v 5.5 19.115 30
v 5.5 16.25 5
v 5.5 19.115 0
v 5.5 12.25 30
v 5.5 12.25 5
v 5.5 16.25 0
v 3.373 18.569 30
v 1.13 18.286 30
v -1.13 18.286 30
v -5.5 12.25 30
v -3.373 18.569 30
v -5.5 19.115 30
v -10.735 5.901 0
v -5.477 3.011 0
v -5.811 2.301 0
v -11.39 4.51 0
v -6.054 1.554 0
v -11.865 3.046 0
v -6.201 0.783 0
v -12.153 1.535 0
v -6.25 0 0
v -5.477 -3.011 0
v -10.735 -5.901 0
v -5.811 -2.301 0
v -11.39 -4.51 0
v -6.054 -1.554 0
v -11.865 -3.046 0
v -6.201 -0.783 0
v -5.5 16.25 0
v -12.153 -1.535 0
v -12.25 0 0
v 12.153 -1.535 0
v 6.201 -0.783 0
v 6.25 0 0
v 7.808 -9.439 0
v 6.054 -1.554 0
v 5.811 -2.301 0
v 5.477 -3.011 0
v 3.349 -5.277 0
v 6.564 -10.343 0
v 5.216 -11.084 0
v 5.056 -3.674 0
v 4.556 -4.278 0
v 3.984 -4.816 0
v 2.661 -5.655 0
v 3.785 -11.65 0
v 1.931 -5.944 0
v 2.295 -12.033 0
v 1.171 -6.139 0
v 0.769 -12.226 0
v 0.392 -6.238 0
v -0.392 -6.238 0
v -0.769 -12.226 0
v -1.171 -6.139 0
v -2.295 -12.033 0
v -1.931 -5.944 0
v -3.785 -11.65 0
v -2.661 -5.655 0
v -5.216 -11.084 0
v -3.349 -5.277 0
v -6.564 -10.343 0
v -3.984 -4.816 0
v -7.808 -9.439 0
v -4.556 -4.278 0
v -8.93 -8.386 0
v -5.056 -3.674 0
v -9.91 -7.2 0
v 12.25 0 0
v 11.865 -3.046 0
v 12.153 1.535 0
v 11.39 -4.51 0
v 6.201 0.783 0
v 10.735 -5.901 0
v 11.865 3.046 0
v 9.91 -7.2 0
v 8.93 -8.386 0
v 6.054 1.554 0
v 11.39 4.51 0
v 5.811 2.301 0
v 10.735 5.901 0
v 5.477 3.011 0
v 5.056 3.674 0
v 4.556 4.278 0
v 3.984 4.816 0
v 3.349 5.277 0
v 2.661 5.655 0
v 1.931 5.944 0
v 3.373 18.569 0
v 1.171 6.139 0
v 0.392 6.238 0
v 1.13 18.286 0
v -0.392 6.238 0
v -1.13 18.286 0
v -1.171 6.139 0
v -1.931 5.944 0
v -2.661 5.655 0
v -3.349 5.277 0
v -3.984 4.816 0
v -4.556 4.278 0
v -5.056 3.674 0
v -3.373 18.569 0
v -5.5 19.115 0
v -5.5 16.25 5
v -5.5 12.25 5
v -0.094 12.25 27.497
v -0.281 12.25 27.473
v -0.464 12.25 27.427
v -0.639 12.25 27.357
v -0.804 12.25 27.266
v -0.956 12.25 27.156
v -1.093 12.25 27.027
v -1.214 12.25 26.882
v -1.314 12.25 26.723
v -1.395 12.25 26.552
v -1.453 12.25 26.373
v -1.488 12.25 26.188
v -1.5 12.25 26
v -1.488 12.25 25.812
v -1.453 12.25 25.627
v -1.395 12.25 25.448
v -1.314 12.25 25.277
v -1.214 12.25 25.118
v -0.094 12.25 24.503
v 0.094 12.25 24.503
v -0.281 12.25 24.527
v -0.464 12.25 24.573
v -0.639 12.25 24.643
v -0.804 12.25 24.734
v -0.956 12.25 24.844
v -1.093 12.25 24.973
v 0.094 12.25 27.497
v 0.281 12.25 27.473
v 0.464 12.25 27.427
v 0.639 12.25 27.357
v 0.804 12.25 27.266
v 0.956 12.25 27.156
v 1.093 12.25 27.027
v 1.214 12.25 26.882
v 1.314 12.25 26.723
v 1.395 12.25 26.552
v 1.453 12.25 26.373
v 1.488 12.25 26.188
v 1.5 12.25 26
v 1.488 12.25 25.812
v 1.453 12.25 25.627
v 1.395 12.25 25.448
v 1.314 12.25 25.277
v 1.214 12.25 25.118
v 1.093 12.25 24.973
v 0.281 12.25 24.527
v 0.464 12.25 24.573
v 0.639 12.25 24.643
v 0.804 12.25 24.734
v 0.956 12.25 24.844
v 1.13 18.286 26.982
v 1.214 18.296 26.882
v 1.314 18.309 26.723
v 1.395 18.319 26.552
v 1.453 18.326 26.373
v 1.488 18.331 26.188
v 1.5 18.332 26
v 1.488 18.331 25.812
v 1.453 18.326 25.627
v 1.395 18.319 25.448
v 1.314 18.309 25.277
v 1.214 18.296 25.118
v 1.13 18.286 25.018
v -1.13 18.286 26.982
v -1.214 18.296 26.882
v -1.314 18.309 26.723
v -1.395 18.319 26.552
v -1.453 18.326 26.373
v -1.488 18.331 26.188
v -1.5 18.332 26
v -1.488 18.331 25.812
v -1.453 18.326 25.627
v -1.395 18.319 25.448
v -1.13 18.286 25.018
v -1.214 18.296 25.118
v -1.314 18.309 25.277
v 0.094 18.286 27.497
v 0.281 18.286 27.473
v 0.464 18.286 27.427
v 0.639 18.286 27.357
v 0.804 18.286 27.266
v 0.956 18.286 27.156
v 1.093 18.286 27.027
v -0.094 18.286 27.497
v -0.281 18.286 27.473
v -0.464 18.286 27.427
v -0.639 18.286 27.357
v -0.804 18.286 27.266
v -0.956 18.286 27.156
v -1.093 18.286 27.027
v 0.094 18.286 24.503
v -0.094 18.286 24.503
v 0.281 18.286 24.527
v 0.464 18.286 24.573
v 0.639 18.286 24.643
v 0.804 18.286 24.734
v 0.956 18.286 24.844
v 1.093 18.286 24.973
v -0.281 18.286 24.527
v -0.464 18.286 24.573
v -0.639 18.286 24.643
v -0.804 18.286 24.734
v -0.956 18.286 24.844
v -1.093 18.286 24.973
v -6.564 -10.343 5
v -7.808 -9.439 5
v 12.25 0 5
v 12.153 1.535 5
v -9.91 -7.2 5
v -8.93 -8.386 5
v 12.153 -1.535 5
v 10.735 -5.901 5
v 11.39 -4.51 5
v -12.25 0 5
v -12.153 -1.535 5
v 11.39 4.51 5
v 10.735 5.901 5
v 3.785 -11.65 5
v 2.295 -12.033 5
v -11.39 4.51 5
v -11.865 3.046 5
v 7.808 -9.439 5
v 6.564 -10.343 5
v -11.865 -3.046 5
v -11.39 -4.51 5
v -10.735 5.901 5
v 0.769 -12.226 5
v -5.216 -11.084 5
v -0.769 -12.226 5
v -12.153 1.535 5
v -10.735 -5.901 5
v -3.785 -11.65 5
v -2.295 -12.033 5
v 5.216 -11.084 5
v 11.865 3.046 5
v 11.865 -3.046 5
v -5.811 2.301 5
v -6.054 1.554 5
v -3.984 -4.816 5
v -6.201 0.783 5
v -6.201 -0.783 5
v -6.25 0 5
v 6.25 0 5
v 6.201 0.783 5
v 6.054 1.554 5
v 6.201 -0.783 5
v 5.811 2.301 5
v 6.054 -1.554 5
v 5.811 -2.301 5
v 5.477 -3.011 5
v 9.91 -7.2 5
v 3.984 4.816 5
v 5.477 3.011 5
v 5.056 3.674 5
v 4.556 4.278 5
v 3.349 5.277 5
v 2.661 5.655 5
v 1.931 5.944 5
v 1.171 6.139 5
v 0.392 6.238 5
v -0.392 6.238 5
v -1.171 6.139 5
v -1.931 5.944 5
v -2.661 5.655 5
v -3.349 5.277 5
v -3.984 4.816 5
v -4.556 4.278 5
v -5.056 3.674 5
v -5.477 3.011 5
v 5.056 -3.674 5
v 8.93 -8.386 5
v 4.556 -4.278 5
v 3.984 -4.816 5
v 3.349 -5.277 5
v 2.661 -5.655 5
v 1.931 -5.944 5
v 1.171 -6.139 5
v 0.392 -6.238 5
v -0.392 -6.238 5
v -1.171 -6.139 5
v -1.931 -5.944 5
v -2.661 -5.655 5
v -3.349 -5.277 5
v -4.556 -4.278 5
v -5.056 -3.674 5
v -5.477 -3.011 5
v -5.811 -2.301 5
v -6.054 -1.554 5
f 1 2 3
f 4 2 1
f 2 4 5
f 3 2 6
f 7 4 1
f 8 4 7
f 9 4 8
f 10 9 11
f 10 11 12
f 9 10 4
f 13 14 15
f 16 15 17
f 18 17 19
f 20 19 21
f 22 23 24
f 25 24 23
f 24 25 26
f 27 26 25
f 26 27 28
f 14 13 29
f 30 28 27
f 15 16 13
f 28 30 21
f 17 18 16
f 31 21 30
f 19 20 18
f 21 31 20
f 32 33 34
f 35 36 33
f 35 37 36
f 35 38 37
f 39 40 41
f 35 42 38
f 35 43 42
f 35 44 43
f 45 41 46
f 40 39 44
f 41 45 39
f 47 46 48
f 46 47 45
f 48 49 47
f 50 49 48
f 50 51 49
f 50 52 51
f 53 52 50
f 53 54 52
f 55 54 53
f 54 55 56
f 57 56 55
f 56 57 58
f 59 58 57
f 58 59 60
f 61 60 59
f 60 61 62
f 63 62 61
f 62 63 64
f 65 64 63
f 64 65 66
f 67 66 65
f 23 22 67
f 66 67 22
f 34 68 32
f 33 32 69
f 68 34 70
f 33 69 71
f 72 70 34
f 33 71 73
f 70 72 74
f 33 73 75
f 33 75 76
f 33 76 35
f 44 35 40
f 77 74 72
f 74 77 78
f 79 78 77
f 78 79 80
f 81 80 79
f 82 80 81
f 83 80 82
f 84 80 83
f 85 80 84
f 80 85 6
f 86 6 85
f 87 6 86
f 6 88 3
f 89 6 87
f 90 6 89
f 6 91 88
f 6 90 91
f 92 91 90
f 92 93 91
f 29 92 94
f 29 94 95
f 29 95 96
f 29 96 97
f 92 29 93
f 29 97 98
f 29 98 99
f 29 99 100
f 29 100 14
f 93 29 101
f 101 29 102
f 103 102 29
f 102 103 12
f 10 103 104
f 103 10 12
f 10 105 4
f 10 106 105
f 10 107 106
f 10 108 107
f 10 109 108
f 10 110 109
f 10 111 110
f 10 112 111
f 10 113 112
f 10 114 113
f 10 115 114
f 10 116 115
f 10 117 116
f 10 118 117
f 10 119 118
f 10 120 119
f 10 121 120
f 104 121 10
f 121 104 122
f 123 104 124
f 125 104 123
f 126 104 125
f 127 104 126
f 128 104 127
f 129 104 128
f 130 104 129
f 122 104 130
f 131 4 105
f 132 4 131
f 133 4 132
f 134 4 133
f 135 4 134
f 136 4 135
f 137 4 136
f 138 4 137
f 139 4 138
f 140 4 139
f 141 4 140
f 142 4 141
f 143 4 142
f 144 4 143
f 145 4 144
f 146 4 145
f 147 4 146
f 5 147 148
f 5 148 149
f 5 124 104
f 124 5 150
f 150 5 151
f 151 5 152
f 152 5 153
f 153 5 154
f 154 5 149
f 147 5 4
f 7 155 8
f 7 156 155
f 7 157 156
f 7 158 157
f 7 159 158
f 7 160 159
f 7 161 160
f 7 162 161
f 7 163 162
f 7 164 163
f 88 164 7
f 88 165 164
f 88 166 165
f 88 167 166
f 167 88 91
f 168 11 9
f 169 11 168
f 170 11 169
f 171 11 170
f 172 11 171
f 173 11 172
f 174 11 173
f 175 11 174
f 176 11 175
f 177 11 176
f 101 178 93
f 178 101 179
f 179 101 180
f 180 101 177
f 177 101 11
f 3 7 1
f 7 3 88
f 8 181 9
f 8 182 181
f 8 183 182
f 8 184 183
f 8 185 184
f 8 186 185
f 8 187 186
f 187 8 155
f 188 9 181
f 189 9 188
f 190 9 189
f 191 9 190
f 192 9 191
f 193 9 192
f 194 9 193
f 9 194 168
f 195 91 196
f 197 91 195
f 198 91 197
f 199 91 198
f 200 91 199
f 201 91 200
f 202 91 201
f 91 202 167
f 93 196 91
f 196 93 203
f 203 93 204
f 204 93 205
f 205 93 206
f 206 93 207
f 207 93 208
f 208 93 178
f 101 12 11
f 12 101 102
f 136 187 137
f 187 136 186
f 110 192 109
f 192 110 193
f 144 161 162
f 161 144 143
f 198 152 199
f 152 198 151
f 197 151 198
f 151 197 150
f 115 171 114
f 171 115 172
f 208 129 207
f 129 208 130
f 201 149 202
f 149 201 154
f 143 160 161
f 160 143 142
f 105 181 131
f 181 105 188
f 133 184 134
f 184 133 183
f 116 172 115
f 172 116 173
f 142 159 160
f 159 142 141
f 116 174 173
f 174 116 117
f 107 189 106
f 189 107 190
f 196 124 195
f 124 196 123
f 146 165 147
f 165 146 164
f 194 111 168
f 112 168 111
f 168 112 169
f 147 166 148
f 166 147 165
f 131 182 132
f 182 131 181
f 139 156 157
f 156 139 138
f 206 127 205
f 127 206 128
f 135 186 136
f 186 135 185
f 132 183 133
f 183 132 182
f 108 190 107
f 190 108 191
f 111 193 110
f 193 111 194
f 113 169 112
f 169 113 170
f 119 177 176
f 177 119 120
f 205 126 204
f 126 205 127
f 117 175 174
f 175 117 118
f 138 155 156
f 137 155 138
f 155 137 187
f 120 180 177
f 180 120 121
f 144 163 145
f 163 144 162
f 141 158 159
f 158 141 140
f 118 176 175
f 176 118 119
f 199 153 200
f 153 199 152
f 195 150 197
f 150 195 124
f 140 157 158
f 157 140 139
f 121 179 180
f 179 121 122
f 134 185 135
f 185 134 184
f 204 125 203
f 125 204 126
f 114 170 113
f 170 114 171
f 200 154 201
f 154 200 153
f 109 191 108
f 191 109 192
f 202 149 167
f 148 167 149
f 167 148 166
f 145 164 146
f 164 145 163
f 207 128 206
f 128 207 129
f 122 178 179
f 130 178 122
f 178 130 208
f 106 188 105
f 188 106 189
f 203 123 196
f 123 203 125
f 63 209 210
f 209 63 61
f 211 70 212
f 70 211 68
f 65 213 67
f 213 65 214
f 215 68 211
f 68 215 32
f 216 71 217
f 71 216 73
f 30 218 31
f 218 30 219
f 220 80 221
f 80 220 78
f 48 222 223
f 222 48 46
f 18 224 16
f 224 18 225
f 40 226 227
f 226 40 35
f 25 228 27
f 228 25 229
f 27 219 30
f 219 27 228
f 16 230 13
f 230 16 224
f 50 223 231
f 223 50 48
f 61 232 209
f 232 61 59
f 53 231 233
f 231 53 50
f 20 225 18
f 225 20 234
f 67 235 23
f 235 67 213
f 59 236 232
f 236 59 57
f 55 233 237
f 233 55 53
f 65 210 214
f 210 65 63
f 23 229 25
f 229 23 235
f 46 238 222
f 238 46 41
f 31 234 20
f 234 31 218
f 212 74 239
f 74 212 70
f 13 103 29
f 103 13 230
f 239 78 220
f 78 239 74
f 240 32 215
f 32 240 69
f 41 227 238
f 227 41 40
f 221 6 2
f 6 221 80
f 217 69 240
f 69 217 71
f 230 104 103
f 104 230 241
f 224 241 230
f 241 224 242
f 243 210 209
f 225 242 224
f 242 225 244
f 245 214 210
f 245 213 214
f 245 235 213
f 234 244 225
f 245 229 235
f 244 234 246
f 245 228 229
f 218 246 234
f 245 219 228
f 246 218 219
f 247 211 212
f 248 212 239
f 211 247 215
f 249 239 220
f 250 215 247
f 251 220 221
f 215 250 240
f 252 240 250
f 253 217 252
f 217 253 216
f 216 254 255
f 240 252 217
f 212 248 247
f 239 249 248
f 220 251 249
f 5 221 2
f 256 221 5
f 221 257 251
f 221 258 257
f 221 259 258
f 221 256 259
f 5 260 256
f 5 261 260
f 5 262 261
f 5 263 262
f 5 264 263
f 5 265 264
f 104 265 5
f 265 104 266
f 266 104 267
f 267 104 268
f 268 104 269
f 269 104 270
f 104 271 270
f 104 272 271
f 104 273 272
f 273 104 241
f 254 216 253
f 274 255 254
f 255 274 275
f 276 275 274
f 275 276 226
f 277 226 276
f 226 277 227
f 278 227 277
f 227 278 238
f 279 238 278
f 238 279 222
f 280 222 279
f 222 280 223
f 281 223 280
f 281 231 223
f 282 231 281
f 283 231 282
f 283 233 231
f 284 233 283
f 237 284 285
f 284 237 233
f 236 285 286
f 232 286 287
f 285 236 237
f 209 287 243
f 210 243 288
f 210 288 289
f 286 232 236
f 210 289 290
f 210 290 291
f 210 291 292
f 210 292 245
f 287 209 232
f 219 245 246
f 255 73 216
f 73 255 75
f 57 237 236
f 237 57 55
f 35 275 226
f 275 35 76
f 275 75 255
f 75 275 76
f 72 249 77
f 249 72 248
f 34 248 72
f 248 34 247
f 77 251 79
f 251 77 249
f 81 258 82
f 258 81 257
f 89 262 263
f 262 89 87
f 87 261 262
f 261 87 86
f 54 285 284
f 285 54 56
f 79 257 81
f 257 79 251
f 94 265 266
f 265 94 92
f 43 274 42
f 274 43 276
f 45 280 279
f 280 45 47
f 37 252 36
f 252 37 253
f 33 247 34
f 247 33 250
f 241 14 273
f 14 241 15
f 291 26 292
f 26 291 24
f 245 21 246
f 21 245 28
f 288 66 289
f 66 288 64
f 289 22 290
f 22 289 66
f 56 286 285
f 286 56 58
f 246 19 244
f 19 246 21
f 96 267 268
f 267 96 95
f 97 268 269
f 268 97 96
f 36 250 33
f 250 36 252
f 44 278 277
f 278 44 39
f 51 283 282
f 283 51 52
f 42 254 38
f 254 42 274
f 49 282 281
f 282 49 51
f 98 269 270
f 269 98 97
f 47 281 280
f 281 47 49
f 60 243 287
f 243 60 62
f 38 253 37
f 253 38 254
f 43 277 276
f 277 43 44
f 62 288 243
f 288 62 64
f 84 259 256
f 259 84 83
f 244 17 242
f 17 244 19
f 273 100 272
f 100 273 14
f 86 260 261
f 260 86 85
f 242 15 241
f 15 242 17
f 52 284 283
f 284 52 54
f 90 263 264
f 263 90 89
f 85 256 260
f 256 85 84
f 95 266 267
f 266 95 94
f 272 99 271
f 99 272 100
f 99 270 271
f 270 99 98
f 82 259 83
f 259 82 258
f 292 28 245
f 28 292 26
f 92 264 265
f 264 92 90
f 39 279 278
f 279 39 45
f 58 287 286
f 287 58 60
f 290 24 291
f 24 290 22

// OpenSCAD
$fn = 50;

length = 30;
diameter = 12.5;
thickness = 12;

height_of_plate=8;
height= 5;
depth = 8;
difference(){
    difference(){
        translate([0, (diameter/2)+(thickness/2)+depth/2, length/2]){
            cube([11, depth, length], center=true);
        }
        translate([0,(diameter/2)+(thickness/2)+(36/2)+depth-2,0]){
            cylinder(r = 36/2, h=length);
        }
    }
    translate([0, (diameter/2)+(thickness/2)+depth, length-(height_of_plate/2)]){
        rotate([90, 0, 0]){
            cylinder(r=1.5, h=depth);
        }
    }
}
difference() {
    hull(){
        translate([0, (diameter/2)+(thickness/2), height / 2]){
            cube([11, 8, height], center=true);
        }

        difference() {
            cylinder(r = (diameter/2)+(thickness / 2), h = height);
            cylinder(r = diameter/2, h = height);
        }
    }
    cylinder(r = diameter/2, h = height);
}
